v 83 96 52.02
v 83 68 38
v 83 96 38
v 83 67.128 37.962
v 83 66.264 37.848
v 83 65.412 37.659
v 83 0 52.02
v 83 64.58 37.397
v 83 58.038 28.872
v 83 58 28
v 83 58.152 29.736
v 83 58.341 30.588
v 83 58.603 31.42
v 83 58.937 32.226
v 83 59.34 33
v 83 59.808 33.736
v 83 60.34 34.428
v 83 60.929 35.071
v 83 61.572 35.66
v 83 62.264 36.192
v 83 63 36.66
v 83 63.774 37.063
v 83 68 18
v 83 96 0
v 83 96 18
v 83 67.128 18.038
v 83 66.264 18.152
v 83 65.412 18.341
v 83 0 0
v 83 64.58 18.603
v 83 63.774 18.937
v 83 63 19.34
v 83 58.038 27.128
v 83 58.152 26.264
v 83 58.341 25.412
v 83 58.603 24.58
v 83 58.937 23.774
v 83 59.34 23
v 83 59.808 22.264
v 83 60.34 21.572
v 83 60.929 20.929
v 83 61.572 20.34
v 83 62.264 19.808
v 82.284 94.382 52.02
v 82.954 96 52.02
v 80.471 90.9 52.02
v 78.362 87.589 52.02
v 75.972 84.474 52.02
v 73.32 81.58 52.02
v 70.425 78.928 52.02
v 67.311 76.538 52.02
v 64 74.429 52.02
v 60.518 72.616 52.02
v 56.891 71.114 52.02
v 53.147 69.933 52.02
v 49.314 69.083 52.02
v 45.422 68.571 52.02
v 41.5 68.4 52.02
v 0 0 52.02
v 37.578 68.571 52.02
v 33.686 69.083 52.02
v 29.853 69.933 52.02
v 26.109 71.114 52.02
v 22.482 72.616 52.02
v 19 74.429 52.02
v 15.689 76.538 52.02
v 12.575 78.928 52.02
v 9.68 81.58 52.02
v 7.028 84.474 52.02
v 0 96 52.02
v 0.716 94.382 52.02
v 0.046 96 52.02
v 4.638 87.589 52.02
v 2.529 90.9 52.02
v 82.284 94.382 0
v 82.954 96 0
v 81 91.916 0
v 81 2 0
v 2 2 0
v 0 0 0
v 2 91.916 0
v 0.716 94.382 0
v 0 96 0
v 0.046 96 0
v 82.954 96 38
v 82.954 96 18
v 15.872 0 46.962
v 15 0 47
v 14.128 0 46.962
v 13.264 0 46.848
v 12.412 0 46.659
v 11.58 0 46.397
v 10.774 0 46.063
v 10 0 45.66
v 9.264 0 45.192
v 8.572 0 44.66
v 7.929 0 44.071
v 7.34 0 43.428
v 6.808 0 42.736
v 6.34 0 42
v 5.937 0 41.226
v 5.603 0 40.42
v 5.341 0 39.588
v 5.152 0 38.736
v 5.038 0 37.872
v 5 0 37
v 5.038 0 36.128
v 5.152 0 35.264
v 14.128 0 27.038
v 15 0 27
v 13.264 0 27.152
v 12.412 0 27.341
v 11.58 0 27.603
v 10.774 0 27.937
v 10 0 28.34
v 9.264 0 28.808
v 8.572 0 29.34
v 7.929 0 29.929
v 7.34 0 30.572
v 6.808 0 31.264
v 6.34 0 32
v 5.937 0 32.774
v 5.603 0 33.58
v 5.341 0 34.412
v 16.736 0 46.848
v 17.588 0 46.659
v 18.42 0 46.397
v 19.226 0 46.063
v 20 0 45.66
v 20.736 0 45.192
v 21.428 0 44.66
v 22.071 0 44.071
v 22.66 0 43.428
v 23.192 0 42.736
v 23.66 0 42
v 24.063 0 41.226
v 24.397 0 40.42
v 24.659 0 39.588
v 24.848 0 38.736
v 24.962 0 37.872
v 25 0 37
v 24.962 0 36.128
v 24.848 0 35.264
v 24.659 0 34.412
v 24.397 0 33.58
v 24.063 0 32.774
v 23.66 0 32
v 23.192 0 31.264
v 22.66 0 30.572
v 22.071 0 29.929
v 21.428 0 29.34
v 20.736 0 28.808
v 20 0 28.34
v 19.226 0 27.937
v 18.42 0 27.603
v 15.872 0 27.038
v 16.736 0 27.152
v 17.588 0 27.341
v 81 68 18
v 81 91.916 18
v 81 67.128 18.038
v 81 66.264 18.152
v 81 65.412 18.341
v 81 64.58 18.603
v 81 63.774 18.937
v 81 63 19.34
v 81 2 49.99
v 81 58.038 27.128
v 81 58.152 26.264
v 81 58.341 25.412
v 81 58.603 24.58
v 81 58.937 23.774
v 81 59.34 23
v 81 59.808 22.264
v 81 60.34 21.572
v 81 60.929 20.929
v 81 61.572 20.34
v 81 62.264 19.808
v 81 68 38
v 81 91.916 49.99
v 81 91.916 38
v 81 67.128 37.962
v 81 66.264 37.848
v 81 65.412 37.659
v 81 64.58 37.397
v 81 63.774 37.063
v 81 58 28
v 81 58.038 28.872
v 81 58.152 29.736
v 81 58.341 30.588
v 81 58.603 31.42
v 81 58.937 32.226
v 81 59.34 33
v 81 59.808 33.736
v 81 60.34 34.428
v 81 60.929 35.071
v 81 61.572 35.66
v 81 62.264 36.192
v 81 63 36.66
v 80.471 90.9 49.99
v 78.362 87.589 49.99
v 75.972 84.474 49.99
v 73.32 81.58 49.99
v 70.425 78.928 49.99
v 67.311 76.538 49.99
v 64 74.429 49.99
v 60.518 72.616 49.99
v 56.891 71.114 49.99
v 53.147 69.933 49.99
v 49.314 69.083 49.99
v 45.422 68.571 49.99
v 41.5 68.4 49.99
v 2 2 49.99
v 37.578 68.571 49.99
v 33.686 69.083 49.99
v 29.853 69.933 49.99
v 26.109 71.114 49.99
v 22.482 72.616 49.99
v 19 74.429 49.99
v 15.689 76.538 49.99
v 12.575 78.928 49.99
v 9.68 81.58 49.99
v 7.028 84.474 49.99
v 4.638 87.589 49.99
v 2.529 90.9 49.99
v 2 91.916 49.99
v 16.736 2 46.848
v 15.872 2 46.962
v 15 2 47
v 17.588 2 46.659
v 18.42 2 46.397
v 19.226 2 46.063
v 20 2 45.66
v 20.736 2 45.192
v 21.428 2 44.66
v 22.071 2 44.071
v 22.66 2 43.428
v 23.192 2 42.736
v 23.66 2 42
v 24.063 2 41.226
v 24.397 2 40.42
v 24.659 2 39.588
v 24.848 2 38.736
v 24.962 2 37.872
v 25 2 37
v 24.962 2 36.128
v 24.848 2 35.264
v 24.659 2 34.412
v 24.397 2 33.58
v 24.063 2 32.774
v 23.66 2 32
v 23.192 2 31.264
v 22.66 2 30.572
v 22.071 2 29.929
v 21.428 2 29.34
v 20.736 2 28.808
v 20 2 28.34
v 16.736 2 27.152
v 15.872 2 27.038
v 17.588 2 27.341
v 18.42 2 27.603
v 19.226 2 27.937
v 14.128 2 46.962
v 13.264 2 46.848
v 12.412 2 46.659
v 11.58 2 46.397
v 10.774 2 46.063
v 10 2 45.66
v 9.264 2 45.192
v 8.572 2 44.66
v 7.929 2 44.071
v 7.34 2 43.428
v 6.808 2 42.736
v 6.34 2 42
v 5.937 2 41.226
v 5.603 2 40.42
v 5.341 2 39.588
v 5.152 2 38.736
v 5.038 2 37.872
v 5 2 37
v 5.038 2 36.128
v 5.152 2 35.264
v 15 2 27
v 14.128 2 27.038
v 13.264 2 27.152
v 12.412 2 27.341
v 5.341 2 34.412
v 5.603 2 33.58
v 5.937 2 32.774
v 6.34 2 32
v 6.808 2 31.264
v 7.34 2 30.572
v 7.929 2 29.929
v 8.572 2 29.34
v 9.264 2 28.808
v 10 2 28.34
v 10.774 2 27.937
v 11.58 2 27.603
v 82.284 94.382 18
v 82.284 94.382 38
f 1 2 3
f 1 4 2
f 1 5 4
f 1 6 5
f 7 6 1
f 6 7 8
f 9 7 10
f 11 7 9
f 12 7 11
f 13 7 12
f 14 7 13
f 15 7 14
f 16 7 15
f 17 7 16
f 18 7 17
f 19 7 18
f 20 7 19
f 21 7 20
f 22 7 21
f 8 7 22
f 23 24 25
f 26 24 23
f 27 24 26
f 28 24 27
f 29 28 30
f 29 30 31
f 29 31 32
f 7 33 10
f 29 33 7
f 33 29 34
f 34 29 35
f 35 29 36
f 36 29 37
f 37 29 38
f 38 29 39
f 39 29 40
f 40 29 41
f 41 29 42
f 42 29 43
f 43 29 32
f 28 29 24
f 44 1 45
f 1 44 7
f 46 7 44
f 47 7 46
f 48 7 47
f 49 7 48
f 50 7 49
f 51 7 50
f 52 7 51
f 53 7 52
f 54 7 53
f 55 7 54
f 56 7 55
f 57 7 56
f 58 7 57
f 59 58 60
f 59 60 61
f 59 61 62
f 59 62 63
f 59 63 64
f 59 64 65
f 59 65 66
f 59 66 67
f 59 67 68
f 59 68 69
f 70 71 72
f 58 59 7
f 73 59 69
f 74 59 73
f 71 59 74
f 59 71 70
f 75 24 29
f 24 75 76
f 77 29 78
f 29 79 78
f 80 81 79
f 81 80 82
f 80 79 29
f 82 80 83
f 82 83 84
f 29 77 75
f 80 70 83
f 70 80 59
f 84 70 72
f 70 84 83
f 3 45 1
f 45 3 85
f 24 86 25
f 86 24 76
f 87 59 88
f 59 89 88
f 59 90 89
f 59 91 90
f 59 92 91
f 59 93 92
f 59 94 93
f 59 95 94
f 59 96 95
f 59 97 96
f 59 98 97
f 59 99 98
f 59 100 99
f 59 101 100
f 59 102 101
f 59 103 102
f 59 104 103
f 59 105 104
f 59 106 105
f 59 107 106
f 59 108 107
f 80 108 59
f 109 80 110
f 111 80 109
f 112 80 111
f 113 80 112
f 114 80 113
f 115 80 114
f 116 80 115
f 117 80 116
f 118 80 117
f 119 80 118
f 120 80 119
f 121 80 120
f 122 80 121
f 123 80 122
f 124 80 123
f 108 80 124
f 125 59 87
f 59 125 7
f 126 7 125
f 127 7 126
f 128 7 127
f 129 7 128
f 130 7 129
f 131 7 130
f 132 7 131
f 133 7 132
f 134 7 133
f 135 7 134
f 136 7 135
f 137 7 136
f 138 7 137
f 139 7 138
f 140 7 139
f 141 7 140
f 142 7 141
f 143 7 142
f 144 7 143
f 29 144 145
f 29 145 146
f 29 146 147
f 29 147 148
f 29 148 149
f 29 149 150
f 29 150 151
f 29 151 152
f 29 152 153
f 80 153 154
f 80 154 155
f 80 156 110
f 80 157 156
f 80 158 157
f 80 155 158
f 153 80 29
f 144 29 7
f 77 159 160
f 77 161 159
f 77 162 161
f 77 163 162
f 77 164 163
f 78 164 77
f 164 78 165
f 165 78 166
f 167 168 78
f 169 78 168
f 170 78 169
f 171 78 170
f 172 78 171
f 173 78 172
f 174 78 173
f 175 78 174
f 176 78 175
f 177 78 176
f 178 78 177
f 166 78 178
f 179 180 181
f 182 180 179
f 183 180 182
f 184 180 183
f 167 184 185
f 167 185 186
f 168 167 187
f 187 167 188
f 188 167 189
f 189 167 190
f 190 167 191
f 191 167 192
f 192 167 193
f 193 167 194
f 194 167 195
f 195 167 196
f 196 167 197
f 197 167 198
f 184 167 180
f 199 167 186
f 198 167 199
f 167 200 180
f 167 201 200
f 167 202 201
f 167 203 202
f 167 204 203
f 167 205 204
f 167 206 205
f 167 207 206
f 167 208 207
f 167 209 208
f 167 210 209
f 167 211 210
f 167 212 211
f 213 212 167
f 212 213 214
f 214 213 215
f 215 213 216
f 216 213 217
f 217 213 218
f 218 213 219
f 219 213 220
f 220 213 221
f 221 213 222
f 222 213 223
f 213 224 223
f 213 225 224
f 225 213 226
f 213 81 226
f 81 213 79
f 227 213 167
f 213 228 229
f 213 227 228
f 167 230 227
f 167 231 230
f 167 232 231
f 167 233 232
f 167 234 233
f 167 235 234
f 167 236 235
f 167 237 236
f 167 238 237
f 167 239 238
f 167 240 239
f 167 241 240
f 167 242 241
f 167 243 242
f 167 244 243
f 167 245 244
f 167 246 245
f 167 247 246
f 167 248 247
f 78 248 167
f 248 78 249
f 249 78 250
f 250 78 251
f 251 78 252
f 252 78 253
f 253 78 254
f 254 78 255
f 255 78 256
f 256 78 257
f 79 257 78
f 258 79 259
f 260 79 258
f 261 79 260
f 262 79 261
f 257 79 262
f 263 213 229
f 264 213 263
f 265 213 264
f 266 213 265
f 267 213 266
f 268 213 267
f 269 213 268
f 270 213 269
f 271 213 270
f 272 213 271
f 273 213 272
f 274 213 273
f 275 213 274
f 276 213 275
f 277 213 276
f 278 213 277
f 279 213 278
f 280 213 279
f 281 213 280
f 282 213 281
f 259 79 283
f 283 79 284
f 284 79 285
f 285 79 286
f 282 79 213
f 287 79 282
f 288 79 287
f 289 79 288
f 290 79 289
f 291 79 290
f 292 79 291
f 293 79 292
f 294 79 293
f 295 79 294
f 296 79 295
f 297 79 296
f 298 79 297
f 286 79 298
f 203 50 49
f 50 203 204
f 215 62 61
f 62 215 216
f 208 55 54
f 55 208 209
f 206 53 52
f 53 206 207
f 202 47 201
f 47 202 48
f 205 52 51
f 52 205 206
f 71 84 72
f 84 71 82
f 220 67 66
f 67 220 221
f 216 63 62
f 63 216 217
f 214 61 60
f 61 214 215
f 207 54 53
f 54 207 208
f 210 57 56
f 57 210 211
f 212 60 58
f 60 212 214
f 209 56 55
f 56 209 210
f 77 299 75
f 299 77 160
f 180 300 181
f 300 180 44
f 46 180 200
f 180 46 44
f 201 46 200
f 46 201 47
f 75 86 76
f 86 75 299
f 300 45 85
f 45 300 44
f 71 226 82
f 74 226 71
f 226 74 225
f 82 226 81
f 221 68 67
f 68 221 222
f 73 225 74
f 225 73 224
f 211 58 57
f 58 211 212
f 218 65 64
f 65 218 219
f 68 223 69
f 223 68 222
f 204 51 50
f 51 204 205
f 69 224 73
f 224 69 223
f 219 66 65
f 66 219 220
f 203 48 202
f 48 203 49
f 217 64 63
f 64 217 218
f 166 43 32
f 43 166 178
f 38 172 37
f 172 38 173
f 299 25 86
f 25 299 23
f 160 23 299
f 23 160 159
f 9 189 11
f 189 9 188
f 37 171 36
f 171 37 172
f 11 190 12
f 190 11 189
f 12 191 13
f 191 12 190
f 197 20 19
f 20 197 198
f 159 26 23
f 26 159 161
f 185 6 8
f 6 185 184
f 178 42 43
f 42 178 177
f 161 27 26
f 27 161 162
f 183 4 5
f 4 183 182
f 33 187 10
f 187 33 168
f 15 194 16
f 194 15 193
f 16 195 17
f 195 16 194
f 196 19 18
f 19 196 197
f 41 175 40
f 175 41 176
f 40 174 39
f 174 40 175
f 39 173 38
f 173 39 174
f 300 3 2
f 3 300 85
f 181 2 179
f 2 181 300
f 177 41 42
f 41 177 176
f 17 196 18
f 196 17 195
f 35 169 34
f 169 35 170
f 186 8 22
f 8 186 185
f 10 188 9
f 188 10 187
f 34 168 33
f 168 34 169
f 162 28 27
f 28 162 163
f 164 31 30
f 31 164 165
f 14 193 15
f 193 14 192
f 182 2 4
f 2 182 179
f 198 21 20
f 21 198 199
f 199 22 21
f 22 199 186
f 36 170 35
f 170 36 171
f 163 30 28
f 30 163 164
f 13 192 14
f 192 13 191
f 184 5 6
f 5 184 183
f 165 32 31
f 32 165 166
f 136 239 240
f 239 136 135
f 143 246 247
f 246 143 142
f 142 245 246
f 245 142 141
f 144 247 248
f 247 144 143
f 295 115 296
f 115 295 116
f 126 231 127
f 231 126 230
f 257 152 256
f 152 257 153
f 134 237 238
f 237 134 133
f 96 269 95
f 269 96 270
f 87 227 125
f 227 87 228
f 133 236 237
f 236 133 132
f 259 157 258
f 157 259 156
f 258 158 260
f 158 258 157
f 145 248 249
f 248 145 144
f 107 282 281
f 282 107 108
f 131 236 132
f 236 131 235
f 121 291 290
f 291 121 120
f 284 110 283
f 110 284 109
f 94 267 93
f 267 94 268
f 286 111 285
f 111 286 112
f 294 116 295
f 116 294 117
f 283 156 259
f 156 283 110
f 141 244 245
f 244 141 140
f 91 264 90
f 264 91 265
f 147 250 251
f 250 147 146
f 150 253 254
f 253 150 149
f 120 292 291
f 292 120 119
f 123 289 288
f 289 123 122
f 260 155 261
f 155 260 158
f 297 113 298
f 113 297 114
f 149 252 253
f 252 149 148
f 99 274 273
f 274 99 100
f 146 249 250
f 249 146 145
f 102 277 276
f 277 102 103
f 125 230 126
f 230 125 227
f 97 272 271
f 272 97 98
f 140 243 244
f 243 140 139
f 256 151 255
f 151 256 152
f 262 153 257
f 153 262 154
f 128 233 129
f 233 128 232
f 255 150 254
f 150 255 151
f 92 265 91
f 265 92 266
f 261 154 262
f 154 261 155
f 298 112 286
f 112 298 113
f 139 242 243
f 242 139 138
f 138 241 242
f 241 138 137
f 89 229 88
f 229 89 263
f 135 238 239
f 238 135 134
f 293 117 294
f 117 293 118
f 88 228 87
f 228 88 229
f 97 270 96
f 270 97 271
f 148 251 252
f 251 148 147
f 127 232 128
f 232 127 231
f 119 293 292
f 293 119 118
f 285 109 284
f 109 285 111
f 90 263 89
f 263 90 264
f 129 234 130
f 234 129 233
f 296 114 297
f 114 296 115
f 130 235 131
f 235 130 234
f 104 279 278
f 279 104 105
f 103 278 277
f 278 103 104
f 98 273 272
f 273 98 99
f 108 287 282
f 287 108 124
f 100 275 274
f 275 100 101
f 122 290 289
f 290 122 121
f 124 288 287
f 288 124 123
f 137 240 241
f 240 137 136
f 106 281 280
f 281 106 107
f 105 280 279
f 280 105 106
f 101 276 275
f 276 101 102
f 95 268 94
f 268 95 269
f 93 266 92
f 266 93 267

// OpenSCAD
$fn=72; // Decent curves please.
$debug=false;

cover_width=83;
cover_depth=96;
cover_height=52;

cover_thickness=2;

connector_radius=10;

gearshaft_radius=10;
gearshaft_offset=28;

ra_radius=45;

axis_offset=sqrt((ra_radius*ra_radius)-((cover_width/2)*(cover_width/2)));

module debug () {
    translate([0, cover_thickness, cover_thickness])
    cube([cover_width, cover_depth, cover_height]);
}

module ra_axis () {
    translate([cover_width/2, cover_depth+axis_offset, 0])
        color([0, 0, 0, 0.2])
            cylinder(r=ra_radius, h=100);
}

module ra_box () {
    difference() {
        cube([cover_width, cover_depth, cover_height + 0.02]);
        translate([cover_thickness, cover_thickness, -0.01]) cube([cover_width-cover_thickness*2, cover_depth, cover_height-cover_thickness]);
    }
}

module gearshaft () {
    translate([cover_width + 0.01, cover_depth-gearshaft_offset, gearshaft_offset])
    rotate([-90, 0, 90])
    hull() {
        cylinder(r=gearshaft_radius, h=cover_thickness + 0.02);
        translate([30, 0, 0]) cylinder(r=gearshaft_radius, h=cover_thickness + 0.02);
    }
}

module connector () {
    translate([cover_thickness+connector_radius+3, -0.01, cover_height-connector_radius-cover_thickness-3])
        rotate([-90, 0, 0])
            cylinder(r=connector_radius, h=cover_thickness+0.02);
}

module ra_cover () {
    union () {
        difference() {
            ra_box();
            ra_axis();
            gearshaft();
            connector();
            if ($debug) {
                debug();
            }
        }
    }
}

color([0.3, 0.3, 0.3, 1])
    ra_cover();
